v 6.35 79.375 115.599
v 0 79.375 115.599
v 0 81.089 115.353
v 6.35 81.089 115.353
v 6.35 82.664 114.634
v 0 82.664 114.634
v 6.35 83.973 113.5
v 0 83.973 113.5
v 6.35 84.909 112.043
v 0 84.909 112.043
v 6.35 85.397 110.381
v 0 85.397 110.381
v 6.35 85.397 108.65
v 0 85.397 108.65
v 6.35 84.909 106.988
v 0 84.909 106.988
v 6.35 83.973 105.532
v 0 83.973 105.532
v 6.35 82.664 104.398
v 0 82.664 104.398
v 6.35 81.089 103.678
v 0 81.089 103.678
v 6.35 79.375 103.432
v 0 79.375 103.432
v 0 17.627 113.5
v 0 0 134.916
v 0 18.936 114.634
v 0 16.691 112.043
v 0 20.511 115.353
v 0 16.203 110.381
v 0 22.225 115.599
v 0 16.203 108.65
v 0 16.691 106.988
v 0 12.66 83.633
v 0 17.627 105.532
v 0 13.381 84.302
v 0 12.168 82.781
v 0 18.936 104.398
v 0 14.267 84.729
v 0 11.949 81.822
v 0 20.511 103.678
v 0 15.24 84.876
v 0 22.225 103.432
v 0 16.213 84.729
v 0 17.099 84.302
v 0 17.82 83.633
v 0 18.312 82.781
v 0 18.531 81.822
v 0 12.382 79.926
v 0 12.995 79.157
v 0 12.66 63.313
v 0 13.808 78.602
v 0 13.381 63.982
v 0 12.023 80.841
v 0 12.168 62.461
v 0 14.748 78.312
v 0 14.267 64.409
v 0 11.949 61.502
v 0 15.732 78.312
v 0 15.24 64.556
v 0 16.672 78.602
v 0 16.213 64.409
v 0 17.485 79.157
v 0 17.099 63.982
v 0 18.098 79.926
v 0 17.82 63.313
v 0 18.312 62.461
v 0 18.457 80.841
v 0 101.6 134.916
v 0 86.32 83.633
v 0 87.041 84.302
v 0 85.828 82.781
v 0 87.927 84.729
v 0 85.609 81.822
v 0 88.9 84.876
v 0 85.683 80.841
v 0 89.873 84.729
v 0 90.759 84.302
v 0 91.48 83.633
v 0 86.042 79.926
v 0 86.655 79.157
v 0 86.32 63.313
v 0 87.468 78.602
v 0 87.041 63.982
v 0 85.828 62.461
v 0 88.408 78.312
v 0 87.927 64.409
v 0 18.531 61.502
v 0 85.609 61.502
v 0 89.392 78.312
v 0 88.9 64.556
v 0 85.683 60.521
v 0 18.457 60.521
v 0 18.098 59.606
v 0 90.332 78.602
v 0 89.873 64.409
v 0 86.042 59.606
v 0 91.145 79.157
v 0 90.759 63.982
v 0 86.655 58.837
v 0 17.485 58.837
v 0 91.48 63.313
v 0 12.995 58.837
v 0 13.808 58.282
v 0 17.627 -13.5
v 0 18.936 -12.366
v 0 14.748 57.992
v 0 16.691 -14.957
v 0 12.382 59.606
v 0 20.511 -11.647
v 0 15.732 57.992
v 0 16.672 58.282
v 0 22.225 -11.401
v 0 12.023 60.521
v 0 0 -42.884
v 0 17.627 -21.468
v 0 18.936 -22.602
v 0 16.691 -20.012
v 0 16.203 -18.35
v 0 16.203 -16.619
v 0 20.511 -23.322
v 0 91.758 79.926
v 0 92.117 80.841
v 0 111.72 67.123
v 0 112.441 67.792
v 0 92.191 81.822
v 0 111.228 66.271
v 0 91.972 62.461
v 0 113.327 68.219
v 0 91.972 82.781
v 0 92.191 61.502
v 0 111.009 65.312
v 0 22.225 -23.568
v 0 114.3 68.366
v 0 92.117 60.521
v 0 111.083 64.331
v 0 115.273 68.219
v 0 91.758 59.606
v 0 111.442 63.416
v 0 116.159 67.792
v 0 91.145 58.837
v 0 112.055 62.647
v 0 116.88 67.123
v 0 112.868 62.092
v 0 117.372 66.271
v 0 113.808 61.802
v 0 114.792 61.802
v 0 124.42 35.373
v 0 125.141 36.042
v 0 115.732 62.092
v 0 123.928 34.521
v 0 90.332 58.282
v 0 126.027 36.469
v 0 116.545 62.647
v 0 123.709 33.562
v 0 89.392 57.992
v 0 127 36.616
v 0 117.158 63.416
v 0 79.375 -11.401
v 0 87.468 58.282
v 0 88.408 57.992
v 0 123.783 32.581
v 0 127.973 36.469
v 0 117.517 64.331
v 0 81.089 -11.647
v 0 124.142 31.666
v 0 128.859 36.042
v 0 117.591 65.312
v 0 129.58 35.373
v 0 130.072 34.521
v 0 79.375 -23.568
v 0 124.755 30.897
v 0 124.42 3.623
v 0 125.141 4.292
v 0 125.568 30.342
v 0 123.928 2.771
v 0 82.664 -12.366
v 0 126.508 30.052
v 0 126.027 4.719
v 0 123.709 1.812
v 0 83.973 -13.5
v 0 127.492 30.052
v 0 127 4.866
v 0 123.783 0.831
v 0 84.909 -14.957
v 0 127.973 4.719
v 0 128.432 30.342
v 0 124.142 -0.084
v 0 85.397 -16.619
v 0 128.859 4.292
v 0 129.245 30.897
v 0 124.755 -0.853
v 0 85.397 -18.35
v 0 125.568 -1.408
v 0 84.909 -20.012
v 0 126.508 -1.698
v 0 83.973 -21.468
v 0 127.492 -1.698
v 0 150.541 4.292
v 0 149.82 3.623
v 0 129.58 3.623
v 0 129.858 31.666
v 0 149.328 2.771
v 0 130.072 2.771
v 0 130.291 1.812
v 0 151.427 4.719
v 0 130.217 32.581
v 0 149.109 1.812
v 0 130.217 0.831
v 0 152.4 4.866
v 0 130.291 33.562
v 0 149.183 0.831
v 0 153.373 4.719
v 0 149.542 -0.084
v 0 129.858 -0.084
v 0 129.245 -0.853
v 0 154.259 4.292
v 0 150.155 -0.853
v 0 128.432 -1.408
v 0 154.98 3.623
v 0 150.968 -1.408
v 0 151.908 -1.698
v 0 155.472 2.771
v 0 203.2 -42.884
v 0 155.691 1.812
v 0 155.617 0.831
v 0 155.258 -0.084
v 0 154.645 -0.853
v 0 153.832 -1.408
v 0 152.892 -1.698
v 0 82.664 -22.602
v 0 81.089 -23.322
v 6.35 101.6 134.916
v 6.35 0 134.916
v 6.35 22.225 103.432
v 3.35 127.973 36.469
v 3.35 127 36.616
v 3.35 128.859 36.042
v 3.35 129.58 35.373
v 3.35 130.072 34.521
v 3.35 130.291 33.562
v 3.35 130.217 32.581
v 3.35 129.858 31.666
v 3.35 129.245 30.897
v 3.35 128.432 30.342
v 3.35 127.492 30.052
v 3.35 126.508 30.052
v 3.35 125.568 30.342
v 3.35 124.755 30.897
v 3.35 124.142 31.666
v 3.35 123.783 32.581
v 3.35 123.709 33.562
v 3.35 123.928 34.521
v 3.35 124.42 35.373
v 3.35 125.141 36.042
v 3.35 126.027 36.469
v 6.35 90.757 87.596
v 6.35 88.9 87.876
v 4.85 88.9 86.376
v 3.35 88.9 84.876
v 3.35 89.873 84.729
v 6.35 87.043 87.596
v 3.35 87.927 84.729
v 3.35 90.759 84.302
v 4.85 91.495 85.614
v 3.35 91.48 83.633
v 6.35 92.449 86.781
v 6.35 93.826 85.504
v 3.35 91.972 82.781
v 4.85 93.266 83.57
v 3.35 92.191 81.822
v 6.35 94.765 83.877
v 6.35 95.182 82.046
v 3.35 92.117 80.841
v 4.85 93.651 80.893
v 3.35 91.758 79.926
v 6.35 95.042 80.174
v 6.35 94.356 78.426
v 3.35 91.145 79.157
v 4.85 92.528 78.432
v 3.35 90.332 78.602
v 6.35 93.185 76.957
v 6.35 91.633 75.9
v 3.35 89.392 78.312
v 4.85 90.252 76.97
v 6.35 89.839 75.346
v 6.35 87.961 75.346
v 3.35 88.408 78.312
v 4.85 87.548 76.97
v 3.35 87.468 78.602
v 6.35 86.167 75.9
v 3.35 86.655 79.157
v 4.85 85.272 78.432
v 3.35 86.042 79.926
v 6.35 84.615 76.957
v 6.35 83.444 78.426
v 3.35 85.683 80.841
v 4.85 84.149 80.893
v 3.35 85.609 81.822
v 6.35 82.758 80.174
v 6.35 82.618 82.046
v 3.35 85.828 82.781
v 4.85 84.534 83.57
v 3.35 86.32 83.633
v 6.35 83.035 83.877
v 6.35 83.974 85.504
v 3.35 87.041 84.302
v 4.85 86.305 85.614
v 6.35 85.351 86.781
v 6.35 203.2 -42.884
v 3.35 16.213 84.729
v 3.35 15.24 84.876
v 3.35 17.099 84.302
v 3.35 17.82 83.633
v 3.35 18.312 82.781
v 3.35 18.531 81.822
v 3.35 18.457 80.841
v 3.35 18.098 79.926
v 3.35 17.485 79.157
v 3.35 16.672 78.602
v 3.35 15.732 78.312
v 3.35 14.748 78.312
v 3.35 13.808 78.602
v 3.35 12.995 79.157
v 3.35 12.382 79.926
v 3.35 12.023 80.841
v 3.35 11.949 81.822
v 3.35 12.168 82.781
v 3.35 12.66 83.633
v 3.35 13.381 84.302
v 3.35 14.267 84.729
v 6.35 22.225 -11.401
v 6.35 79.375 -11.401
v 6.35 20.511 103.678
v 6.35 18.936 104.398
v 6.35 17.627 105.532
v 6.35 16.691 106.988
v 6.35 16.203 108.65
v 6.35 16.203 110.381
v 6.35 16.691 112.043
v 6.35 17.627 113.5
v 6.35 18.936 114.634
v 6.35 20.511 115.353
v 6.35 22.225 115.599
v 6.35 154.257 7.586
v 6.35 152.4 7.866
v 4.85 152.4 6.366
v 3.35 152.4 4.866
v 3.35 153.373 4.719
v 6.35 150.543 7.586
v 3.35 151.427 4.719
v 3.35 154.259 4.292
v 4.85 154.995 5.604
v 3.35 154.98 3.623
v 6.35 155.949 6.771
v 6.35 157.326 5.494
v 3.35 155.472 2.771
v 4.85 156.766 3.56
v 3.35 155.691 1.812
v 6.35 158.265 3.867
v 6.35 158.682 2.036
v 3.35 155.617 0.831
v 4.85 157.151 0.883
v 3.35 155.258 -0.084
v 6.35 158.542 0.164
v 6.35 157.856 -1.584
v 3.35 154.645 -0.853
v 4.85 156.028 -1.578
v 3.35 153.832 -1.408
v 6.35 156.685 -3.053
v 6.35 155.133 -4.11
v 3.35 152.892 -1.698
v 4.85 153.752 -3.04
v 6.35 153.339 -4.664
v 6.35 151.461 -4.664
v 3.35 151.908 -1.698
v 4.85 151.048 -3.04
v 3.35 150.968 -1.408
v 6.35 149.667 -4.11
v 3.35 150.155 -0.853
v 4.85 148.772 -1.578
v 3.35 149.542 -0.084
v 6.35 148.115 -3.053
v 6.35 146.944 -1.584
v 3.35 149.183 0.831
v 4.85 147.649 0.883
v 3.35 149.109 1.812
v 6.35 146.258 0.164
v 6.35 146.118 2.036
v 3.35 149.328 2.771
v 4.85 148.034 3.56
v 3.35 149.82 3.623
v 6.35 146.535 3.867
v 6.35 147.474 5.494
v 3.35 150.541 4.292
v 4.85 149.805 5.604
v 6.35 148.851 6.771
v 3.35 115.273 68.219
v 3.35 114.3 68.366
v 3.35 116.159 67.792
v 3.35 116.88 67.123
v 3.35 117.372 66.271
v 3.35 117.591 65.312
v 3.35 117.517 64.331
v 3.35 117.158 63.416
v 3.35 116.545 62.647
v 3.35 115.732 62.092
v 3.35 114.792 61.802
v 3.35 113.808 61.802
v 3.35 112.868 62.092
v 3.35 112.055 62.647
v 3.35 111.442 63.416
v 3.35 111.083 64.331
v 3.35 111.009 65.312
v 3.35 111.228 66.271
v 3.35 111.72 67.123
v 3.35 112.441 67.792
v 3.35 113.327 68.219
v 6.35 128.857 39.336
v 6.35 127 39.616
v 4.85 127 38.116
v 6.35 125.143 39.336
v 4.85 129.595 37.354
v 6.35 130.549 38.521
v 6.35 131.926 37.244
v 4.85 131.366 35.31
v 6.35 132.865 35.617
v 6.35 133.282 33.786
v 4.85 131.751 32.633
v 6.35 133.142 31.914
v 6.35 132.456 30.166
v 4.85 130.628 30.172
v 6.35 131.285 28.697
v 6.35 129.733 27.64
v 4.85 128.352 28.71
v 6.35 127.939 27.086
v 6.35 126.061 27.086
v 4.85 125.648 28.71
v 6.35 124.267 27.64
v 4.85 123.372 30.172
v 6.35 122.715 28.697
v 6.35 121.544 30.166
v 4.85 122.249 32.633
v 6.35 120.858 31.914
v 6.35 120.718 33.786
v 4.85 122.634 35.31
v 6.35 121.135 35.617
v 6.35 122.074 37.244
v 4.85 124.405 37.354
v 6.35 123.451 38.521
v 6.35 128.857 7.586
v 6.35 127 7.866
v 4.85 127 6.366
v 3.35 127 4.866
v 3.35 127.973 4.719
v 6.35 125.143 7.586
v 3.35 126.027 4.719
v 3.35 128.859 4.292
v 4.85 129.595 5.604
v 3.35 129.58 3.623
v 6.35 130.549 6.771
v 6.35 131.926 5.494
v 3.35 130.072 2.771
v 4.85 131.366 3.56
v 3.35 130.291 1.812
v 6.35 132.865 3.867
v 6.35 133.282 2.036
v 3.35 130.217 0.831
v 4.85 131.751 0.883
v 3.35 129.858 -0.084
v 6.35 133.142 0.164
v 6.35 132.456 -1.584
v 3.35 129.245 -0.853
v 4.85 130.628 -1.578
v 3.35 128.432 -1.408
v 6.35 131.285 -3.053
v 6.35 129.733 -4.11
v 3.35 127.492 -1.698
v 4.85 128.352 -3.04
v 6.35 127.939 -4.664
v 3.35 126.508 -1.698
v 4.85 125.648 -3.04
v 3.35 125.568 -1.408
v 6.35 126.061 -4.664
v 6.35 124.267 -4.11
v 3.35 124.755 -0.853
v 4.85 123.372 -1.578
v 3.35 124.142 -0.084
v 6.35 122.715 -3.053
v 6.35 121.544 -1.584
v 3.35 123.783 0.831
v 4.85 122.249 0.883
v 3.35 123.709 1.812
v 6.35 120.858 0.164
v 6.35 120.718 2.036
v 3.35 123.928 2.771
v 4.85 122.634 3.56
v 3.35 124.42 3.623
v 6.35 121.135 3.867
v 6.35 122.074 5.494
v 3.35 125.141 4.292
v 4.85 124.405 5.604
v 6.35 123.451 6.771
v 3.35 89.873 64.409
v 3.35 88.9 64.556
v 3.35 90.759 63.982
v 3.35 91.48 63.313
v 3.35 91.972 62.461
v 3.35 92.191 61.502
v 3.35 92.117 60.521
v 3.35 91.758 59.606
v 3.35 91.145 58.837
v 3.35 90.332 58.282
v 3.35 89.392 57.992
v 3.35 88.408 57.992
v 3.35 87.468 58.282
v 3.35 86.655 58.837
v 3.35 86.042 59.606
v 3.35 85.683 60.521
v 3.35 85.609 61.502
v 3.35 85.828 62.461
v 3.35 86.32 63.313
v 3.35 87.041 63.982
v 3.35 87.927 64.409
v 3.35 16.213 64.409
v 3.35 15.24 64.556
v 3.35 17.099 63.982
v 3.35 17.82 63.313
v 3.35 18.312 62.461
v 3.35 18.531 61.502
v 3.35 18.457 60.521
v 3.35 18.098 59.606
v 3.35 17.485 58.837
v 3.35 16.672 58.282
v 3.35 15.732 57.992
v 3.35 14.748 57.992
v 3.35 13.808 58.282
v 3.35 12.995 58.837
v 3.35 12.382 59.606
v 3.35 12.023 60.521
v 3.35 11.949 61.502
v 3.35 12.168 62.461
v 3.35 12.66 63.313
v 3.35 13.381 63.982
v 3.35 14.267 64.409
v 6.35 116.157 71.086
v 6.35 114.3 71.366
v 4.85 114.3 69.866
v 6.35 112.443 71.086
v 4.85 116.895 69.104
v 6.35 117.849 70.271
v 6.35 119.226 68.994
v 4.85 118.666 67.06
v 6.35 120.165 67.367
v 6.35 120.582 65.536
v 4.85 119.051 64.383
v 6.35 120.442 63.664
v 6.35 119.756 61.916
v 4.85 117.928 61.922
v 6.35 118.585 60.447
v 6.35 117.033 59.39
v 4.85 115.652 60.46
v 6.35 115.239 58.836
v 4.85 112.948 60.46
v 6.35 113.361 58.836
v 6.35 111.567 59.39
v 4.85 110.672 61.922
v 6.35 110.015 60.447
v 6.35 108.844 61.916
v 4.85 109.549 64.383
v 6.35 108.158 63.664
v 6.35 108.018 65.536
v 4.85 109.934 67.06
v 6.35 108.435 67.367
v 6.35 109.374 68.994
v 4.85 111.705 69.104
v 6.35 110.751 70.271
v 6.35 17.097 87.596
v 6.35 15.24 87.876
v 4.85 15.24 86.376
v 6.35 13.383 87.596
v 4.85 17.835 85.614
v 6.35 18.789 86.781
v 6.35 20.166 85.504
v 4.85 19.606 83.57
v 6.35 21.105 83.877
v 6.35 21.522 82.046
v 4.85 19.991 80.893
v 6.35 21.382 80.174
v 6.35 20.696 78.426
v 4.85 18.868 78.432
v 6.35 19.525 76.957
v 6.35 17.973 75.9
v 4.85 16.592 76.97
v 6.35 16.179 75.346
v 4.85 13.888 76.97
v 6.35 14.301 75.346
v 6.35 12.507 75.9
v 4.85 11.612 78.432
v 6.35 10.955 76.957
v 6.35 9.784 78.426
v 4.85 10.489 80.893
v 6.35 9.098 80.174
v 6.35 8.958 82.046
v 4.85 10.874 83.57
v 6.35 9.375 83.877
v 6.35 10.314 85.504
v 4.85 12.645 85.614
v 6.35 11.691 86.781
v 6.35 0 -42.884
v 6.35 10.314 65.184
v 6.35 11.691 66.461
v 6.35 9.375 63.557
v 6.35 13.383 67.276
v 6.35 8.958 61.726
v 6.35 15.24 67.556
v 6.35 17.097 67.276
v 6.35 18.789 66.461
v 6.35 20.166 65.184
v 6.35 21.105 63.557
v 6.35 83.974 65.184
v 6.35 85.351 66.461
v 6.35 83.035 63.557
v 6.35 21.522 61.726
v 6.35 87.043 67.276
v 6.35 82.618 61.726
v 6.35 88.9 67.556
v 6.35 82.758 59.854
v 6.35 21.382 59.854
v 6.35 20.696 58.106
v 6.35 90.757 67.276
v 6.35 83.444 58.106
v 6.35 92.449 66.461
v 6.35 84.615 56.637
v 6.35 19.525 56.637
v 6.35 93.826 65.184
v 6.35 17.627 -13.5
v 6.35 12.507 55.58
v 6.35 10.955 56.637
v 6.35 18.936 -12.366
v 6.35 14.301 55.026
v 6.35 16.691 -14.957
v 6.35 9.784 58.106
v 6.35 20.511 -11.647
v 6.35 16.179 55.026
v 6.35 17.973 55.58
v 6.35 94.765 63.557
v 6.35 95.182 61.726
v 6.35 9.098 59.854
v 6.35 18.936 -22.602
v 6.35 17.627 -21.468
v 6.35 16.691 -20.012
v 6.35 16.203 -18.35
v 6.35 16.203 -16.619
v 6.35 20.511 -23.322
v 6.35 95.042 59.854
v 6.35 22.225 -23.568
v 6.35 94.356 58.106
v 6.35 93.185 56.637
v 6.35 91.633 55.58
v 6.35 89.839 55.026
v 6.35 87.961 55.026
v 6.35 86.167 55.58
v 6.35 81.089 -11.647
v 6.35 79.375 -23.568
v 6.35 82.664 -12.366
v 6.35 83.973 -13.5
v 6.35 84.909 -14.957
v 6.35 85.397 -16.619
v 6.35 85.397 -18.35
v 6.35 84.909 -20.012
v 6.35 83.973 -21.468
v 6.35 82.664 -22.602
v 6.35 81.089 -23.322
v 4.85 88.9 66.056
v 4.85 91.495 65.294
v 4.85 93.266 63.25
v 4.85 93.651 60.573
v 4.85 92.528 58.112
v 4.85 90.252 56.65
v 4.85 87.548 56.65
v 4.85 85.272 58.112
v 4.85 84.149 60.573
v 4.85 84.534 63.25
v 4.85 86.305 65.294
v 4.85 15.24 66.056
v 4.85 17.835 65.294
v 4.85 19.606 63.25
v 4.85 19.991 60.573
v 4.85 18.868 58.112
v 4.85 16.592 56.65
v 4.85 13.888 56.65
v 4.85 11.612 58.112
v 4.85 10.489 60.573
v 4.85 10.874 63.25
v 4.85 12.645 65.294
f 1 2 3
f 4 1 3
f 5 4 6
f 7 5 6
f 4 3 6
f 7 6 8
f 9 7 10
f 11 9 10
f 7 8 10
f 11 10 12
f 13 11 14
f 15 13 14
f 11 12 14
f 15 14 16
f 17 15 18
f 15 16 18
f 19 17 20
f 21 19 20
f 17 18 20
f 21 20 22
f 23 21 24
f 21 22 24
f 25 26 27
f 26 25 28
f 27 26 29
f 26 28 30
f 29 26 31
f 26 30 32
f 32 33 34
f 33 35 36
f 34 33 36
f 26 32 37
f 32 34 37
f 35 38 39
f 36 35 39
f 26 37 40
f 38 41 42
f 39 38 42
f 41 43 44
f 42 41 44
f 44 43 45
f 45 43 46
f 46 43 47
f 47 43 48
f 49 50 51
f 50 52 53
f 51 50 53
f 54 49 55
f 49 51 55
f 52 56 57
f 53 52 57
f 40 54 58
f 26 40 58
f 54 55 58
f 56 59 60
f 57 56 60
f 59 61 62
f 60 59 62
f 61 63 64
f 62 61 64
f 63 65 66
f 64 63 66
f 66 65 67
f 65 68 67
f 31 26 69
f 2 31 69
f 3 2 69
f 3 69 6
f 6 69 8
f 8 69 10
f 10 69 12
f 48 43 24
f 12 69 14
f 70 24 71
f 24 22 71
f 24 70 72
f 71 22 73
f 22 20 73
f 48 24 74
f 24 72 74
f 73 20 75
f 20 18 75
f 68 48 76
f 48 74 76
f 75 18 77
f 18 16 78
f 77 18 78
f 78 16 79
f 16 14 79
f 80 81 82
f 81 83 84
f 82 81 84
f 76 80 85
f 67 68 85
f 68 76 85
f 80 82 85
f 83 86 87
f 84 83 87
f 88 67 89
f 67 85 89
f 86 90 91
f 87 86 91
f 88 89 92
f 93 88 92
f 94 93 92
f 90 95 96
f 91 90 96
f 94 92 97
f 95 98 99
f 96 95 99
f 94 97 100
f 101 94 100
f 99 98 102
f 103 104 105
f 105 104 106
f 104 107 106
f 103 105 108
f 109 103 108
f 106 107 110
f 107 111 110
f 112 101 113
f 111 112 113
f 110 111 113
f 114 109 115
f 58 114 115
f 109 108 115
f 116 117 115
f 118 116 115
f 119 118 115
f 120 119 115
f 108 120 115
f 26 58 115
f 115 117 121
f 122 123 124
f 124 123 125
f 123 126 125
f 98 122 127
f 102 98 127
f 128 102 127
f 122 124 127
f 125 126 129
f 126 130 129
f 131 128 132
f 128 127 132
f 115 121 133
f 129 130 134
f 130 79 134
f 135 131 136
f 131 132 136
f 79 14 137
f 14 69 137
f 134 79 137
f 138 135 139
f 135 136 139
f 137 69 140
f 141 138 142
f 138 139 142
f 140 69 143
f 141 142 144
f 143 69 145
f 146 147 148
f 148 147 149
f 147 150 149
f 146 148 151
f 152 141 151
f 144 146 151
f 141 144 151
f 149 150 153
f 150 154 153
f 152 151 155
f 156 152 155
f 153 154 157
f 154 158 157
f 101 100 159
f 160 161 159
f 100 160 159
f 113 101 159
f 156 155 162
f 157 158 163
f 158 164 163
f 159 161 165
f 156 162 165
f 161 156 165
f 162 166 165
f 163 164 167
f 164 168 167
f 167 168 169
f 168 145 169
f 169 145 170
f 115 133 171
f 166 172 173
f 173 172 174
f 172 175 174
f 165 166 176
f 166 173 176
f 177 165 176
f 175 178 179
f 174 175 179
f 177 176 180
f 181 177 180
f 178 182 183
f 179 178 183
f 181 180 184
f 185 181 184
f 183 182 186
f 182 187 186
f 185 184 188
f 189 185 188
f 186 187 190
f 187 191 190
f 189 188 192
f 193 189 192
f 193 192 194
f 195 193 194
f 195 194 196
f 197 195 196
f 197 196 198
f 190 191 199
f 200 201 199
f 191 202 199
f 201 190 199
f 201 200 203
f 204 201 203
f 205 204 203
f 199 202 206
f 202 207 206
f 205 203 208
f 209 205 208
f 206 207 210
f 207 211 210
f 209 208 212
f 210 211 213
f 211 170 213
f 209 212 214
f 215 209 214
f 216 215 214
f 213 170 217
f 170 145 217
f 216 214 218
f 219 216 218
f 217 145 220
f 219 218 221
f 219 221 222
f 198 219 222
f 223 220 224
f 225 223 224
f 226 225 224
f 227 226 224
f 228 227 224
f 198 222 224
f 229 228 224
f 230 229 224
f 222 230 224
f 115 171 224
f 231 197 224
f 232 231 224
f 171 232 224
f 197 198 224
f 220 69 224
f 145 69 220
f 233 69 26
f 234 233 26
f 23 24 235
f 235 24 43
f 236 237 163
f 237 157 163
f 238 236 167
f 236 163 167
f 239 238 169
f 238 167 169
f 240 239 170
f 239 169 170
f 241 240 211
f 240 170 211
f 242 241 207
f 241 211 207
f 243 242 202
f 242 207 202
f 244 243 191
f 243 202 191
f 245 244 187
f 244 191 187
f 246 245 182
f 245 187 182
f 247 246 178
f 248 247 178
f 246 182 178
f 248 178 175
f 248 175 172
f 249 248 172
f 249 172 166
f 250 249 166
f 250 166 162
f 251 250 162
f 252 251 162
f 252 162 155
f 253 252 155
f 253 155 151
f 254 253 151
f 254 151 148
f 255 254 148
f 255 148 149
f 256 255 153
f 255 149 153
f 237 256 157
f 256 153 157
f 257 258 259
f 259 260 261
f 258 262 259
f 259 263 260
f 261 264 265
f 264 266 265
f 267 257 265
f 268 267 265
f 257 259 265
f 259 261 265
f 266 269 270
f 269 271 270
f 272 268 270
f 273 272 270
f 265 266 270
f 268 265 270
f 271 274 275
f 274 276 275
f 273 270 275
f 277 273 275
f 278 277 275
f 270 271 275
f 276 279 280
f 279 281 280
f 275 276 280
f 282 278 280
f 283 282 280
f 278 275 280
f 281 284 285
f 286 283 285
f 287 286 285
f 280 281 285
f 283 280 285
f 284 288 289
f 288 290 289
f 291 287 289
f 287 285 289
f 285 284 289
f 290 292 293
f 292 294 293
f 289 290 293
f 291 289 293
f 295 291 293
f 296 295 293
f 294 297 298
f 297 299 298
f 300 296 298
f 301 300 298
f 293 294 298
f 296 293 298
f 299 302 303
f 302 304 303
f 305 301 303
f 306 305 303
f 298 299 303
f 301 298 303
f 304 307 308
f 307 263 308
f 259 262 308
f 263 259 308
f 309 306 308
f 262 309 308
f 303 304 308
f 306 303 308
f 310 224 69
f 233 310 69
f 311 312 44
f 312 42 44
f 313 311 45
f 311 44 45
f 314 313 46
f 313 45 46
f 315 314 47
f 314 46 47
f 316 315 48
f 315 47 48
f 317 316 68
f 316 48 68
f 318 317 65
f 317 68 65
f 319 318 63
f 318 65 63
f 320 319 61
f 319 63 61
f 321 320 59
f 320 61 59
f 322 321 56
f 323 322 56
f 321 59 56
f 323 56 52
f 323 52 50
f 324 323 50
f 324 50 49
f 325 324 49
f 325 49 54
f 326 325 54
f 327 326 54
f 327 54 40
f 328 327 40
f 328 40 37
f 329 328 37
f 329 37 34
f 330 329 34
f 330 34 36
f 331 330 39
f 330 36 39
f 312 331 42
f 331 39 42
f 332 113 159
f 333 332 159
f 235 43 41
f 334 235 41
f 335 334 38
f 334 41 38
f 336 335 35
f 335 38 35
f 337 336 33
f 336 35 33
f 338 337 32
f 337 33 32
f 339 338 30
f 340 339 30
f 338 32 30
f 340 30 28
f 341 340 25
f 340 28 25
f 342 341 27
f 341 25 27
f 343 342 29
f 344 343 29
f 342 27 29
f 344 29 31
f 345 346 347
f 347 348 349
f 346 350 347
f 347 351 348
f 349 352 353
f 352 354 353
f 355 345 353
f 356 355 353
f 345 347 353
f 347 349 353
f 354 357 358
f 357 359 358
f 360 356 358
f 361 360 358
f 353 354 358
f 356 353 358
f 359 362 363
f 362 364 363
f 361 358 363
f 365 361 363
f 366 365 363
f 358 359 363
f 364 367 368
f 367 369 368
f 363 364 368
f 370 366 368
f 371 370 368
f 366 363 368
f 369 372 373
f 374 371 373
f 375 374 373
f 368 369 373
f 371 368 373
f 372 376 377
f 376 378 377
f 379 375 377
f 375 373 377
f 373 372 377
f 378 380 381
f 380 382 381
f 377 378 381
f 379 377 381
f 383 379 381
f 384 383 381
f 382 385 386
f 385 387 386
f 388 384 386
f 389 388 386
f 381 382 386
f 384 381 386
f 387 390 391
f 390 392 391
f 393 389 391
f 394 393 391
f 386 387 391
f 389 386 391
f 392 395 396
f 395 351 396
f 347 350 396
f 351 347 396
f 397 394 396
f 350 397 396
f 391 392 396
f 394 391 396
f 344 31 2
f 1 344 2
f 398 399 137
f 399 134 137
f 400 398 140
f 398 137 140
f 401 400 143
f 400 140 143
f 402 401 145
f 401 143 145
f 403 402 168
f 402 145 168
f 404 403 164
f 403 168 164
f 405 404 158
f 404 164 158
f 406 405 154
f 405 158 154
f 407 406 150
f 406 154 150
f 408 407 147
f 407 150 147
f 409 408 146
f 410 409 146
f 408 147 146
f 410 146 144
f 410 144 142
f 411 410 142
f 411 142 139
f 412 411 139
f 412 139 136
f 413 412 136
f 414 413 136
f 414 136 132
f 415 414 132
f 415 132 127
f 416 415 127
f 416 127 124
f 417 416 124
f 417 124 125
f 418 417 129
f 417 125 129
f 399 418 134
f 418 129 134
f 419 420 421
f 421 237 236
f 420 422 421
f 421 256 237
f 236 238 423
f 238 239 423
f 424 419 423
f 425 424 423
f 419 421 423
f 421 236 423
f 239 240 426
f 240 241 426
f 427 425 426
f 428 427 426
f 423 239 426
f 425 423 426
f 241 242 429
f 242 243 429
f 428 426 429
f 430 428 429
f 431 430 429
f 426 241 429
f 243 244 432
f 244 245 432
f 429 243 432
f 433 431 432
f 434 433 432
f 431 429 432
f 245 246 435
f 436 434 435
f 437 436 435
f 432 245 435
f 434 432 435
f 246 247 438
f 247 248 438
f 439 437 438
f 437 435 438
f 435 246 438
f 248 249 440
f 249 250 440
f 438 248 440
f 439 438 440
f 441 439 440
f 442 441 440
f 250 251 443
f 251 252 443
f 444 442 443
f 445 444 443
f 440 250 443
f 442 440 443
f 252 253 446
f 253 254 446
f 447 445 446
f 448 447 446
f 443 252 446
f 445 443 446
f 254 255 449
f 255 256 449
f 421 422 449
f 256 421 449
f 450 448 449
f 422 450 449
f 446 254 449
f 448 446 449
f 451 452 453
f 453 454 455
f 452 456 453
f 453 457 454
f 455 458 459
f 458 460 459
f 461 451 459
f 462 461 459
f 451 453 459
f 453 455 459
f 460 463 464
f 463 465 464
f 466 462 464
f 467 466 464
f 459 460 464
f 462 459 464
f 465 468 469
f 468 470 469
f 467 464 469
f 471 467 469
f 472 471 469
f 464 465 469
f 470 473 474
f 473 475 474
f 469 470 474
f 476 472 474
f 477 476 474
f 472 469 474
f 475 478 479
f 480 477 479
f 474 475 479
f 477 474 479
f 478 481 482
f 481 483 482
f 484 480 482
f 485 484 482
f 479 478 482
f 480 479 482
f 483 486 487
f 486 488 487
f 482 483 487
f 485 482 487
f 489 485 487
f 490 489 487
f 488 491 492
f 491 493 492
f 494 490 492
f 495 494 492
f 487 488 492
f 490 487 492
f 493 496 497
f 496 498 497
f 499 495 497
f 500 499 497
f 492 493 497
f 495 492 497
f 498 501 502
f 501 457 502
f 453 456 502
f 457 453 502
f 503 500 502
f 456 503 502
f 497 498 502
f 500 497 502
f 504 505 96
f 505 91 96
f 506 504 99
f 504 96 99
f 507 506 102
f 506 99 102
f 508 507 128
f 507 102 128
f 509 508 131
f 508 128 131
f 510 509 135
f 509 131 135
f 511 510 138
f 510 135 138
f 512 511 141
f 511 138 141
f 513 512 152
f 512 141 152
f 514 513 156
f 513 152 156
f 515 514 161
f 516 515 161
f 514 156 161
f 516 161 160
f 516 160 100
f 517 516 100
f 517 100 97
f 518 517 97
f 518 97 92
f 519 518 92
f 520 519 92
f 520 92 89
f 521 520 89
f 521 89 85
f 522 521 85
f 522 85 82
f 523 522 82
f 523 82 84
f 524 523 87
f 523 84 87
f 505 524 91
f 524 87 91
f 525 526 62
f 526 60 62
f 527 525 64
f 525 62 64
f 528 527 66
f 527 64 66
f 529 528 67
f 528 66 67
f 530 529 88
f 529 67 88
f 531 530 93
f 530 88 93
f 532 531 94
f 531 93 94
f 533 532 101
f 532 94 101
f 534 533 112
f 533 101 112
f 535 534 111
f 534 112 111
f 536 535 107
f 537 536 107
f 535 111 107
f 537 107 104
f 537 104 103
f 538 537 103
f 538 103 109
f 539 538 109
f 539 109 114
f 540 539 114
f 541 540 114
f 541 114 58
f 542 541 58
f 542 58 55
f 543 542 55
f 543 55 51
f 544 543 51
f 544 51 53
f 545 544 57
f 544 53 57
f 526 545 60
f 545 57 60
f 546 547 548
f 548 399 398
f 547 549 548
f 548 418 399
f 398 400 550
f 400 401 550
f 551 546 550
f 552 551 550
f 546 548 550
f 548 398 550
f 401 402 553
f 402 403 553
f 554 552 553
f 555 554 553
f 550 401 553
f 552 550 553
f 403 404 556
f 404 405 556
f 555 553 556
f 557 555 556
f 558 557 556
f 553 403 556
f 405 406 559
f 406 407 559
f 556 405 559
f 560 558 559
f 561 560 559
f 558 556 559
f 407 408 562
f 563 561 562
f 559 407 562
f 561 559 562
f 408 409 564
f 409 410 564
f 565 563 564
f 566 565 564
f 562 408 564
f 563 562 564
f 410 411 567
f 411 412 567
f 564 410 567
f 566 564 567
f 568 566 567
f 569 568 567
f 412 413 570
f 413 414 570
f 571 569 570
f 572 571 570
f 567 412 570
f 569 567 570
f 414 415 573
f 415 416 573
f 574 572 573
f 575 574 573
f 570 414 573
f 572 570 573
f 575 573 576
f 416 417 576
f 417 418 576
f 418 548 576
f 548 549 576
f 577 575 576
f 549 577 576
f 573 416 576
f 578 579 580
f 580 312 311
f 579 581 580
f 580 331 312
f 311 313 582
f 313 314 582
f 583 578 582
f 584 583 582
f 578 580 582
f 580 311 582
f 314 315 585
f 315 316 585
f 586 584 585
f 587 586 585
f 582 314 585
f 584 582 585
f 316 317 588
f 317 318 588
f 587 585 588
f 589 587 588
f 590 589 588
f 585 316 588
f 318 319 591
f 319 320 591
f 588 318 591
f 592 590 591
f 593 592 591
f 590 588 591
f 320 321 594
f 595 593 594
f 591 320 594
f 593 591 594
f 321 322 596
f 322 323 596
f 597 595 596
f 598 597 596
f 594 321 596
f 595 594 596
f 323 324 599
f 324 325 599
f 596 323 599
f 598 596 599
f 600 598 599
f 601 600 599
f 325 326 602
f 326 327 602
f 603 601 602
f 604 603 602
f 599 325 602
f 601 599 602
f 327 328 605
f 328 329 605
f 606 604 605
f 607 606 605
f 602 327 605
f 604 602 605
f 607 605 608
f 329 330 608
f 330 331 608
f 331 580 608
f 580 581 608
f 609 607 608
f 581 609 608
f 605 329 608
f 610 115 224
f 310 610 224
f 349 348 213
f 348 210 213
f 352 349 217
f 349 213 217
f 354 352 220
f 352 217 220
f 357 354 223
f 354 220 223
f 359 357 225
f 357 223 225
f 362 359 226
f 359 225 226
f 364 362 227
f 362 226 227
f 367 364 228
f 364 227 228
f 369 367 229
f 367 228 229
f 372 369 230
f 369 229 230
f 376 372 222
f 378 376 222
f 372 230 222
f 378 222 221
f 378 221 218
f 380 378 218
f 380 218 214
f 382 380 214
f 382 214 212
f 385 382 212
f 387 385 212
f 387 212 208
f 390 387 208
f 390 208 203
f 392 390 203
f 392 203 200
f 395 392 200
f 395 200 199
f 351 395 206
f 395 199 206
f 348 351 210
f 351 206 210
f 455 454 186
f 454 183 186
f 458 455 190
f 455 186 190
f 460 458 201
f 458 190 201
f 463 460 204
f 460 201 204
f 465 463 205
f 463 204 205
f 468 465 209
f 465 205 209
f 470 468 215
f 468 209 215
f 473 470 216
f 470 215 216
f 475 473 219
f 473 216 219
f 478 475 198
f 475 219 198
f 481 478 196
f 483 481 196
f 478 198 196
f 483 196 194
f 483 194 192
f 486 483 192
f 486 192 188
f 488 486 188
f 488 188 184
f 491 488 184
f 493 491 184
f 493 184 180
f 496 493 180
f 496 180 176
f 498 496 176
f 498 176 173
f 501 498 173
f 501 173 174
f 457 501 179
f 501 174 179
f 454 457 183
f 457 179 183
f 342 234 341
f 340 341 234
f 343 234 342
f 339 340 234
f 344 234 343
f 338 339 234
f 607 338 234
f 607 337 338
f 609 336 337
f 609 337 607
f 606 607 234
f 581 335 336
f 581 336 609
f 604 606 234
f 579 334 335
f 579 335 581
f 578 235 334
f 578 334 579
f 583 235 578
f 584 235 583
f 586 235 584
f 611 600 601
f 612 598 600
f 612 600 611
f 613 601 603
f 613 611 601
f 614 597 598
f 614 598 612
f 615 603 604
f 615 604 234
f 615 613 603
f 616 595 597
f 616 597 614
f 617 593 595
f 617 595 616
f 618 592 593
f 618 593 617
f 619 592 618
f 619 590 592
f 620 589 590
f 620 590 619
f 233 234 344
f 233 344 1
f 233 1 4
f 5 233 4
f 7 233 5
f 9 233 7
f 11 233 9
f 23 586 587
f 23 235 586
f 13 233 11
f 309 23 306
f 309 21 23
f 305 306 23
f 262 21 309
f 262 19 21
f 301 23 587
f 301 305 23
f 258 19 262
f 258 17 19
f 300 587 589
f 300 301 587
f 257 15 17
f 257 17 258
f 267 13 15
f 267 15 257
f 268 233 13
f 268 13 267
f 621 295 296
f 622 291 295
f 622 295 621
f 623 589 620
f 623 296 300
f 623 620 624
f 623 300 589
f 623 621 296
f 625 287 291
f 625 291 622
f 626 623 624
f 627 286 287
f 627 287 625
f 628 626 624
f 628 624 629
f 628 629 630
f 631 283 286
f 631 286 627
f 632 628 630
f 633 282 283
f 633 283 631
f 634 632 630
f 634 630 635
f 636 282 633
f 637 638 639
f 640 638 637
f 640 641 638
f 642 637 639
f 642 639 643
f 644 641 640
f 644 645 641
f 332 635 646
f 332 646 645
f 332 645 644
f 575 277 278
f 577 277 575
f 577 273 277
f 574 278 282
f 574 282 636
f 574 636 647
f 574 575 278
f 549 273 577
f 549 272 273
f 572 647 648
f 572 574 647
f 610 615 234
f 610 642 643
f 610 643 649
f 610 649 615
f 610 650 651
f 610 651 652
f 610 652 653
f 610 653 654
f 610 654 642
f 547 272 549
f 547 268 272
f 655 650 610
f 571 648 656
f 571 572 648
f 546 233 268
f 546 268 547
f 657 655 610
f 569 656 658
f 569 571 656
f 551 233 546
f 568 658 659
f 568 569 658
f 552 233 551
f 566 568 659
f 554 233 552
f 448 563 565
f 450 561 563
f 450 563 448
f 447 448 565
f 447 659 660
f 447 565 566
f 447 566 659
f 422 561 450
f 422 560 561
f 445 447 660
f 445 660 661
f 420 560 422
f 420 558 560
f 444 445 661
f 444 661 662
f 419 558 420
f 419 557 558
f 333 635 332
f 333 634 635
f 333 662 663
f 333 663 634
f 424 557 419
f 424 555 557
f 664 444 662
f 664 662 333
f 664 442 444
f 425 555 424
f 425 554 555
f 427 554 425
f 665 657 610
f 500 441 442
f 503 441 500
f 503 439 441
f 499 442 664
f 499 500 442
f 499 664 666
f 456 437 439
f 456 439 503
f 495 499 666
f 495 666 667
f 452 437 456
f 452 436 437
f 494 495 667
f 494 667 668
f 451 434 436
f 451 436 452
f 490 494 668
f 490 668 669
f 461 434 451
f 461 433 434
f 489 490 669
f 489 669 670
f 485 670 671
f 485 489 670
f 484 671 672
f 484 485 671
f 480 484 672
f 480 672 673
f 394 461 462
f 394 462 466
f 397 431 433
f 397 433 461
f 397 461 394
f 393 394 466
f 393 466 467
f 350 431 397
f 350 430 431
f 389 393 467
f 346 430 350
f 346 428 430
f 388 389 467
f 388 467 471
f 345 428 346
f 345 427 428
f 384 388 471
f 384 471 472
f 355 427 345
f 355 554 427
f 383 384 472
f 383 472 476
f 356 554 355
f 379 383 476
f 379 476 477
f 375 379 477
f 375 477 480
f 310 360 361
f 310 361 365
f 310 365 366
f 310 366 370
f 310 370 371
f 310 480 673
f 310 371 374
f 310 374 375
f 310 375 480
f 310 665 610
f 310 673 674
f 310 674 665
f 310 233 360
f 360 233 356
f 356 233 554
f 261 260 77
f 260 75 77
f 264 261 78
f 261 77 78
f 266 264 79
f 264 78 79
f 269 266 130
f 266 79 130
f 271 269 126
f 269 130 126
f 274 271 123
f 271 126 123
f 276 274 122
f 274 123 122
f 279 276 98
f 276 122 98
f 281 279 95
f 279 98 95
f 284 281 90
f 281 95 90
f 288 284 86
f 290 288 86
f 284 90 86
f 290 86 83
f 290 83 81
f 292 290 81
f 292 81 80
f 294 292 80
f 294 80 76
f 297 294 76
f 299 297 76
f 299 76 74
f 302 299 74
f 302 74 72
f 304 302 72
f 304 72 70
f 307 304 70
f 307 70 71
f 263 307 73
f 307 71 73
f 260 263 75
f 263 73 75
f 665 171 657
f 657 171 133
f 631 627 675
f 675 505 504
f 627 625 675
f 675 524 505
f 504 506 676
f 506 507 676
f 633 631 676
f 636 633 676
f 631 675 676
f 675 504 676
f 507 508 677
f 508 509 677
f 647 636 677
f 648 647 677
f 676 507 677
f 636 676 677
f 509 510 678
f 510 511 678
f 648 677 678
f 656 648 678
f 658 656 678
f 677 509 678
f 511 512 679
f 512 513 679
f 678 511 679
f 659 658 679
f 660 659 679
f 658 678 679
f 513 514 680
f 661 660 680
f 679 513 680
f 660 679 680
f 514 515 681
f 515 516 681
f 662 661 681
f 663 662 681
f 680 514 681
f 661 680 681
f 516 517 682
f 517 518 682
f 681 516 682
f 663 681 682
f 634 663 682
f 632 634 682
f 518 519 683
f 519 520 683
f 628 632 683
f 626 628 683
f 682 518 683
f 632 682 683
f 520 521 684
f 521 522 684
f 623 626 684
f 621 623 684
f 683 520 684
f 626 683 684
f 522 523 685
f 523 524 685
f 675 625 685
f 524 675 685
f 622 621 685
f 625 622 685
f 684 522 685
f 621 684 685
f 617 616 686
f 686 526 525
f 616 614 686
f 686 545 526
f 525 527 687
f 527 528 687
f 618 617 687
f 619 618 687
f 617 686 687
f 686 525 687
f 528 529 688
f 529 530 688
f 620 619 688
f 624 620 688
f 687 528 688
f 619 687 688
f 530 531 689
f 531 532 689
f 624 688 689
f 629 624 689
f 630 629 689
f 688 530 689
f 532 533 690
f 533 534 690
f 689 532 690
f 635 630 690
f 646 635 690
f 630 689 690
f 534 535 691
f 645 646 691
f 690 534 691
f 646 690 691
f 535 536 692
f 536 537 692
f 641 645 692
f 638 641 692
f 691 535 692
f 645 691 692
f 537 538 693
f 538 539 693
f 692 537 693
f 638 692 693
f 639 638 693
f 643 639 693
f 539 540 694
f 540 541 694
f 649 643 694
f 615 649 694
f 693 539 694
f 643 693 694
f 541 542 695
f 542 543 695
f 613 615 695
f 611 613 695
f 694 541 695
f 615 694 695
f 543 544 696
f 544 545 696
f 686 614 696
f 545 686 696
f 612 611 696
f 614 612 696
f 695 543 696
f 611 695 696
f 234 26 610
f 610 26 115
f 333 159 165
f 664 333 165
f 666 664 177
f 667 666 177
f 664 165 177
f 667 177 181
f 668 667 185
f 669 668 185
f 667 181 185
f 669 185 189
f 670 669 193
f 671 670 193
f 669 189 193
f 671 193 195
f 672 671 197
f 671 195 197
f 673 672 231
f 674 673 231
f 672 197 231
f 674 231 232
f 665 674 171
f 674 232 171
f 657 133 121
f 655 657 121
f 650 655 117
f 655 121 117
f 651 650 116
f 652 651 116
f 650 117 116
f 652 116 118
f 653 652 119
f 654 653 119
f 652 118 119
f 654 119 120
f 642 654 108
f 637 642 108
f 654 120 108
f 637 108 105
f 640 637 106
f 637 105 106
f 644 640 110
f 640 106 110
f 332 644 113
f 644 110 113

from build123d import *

# Parameters (mm, degrees)
BOSS_EXTRUDE1_DEPTH                             = 6.35
CSK_FOR_M6_FLAT_HEAD_MACHINE_SCREW1_D           = 6.6
CSK_FOR_M6_FLAT_HEAD_MACHINE_SCREW1_CSINK_D     = 12.6
CSK_FOR_M6_FLAT_HEAD_MACHINE_SCREW1_CSINK_ANGLE = 90
CSK_FOR_M6_FLAT_HEAD_MACHINE_SCREW2_D           = 6.6
CSK_FOR_M6_FLAT_HEAD_MACHINE_SCREW2_CSINK_D     = 12.6
CSK_FOR_M6_FLAT_HEAD_MACHINE_SCREW2_CSINK_ANGLE = 90


with BuildPart() as part:
    # Sketch2 → Boss-Extrude1 (new body)
    # profile 1 of 3: a face of its own
    with BuildSketch(Plane(origin=(0, 0, 0), x_dir=(0, 0, -1), z_dir=(1, 0, 0))):
        Polygon((-134.915615546, 101.6), (-134.915615546, 0), (-46.015615546, 0), (-46.015615546, 50.8), (-46.015615546, 101.6), align=None)
        with BuildLine():
            Line((-103.431783211, 79.375), (-103.431783211, 50.8))
            Line((-103.431783211, 50.8), (-103.431783211, 22.225))
            ThreePointArc((-103.431783211, 22.225), (-109.515615546, 16.141167665), (-115.599447882, 22.225))
            Line((-115.599447882, 22.225), (-115.599447882, 79.375))
            ThreePointArc((-115.599447882, 79.375), (-109.515615546, 85.458832335), (-103.431783211, 79.375))
        make_face(mode=Mode.SUBTRACT)
    # profile 2 of 3: a face of its own
    with BuildSketch(Plane(origin=(0, 0, 0), x_dir=(0, 0, -1), z_dir=(1, 0, 0))):
        Polygon((42.884384454, 203.2), (-134.915615546, 101.6), (-46.015615546, 101.6), (42.884384454, 101.6), align=None)
    # profile 3 of 3: a face of its own
    with BuildSketch(Plane(origin=(0, 0, 0), x_dir=(0, 0, -1), z_dir=(1, 0, 0))):
        Polygon((-46.015615546, 50.8), (-46.015615546, 0), (42.884384454, 0), (42.884384454, 101.6), (-46.015615546, 101.6), align=None)
        with BuildLine():
            Line((11.400552118, 22.225), (11.400552118, 50.8))
            Line((11.400552118, 50.8), (11.400552118, 79.375))
            ThreePointArc((11.400552118, 79.375), (17.484384454, 85.458832335), (23.568216789, 79.375))
            Line((23.568216789, 79.375), (23.568216789, 22.225))
            ThreePointArc((23.568216789, 22.225), (17.484384454, 16.141167665), (11.400552118, 22.225))
        make_face(mode=Mode.SUBTRACT)
    extrude(amount=BOSS_EXTRUDE1_DEPTH)

    # CSK for M6 Flat Head Machine Screw1 (through all)
    with Locations(Plane(origin=(6.35, 0, 0), x_dir=(0, 0, -1), z_dir=(1, 0, 0))):
        with Locations((-81.575615546, 15.24), (-81.575615546, 88.9), (-61.255615546, 88.9), (-61.255615546, 15.24)):
            CounterSinkHole(CSK_FOR_M6_FLAT_HEAD_MACHINE_SCREW1_D / 2, CSK_FOR_M6_FLAT_HEAD_MACHINE_SCREW1_CSINK_D / 2, counter_sink_angle=CSK_FOR_M6_FLAT_HEAD_MACHINE_SCREW1_CSINK_ANGLE)

    # CSK for M6 Flat Head Machine Screw2 (through all)
    with Locations(Plane(origin=(6.35, 0, 0), x_dir=(0, 0, -1), z_dir=(1, 0, 0))):
        with Locations((-65.065615546, 114.3), (-33.315615546, 127), (-1.565615546, 127), (-1.565615546, 152.4)):
            CounterSinkHole(CSK_FOR_M6_FLAT_HEAD_MACHINE_SCREW2_D / 2, CSK_FOR_M6_FLAT_HEAD_MACHINE_SCREW2_CSINK_D / 2, counter_sink_angle=CSK_FOR_M6_FLAT_HEAD_MACHINE_SCREW2_CSINK_ANGLE)


solid = part.part
